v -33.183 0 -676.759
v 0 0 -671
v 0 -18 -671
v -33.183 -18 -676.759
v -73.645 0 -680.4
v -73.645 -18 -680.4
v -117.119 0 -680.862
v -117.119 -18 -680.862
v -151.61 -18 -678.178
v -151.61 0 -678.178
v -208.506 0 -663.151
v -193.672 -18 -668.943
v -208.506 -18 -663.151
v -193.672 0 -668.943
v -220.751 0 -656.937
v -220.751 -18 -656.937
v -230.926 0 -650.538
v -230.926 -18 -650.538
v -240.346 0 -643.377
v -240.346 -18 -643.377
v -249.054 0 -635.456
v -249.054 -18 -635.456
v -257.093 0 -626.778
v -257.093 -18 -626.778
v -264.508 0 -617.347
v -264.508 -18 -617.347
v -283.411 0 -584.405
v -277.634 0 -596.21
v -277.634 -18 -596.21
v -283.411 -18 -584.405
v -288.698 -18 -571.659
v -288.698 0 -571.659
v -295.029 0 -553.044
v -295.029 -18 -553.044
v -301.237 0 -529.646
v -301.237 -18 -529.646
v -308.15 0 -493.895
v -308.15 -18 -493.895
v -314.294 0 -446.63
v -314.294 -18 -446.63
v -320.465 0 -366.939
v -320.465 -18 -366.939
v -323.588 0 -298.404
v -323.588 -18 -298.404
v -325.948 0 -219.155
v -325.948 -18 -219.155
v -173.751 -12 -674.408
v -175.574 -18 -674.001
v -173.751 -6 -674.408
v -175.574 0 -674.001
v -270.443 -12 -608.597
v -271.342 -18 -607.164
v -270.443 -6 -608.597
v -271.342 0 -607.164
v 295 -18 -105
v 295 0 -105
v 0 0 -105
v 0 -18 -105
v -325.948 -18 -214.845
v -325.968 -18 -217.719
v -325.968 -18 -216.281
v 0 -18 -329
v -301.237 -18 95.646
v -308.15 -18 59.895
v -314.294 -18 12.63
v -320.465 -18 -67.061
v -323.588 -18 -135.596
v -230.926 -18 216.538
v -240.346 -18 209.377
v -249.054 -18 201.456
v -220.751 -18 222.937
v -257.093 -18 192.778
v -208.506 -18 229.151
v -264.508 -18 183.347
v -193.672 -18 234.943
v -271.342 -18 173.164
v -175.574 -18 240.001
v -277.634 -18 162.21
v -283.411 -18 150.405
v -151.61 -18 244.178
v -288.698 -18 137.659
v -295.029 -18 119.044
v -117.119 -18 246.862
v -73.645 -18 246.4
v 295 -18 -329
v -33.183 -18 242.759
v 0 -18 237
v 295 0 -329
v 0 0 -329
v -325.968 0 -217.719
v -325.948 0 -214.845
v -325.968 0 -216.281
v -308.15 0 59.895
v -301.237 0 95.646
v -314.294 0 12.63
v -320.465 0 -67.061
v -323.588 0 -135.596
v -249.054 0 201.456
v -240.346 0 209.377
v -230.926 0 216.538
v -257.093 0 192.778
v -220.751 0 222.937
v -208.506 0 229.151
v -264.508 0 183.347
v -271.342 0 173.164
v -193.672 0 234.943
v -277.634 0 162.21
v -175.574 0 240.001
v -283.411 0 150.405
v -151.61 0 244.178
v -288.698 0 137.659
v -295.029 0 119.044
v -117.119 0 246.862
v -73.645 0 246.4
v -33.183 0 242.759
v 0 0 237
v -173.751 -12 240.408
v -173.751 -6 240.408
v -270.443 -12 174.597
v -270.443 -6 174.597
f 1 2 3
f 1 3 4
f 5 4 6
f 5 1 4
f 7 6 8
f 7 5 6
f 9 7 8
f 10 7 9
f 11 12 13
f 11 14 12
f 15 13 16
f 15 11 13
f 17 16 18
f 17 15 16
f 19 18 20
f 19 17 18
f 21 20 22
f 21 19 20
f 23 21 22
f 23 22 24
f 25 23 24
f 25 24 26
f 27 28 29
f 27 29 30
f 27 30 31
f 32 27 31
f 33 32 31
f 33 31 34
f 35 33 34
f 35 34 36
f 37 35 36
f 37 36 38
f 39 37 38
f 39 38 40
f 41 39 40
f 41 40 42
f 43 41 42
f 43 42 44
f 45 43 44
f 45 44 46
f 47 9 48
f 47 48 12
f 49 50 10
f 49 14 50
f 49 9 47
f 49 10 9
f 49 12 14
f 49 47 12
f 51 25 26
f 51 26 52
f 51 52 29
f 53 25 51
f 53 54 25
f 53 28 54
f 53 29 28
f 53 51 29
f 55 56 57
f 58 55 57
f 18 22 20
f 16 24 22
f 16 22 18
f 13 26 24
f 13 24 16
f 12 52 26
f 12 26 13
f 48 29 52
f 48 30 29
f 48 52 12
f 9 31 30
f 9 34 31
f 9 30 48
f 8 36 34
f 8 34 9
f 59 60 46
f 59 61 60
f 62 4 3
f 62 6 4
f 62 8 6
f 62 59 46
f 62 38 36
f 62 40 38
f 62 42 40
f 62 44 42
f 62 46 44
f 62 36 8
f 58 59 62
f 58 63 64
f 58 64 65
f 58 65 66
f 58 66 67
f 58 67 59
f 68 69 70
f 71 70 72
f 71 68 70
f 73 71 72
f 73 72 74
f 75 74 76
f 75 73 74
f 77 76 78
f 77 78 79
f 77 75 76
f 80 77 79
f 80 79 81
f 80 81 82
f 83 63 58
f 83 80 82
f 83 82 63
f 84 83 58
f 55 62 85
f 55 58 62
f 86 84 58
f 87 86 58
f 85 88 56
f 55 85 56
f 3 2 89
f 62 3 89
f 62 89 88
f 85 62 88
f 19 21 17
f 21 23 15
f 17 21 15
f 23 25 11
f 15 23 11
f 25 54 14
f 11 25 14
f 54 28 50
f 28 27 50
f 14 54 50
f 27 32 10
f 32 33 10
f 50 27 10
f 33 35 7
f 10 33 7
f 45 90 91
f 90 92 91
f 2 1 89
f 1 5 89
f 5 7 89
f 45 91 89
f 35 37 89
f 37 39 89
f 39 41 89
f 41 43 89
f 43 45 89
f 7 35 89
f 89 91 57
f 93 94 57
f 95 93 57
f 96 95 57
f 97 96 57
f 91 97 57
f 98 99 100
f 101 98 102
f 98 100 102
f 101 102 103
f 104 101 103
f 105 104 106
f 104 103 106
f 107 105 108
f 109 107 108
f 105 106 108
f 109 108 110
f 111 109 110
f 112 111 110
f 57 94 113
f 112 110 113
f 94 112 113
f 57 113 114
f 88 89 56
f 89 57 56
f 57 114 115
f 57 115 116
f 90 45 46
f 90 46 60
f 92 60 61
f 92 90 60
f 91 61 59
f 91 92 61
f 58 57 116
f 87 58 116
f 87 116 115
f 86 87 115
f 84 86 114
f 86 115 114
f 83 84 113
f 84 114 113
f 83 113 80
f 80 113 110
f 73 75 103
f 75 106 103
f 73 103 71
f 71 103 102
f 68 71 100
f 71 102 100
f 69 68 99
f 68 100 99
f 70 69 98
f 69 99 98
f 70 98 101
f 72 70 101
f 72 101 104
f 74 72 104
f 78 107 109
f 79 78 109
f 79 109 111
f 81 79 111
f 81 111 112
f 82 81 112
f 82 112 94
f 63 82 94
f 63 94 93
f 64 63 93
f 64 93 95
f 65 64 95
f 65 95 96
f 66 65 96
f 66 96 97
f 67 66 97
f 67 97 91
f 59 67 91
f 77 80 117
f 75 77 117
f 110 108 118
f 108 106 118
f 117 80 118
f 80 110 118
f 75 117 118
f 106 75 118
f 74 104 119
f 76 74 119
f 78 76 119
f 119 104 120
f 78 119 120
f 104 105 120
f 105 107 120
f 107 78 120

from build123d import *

# Parameters (mm, degrees)
F1_DEPTH    = 18
F2_T1_DEPTH = 30.2017817416


# Not quite as in the source:
# - a fillet or chamfer that OpenCascade refuses, or shapes differently, is made with other operations: its cross-section is extruded or revolved along the edge and cut away or added


with BuildPart() as f1:
    # F0 (on Front) → F1 (new body)
    with BuildSketch(Plane.XZ):
        with BuildLine():
            Line((295, -217), (-326, -217))
            add(Edge.make_bspline(
                [(0, -671), (-40.9557190503, -680.4161054833), (-182.3770697918, -691.4241372136), (-304.1643703394, -601.8547700973), (-320.5121159554, -444.292366147), (-326, -217)],
                knots=[0, 0, 0, 0, 0.3003903091, 0.5468271605, 1, 1, 1, 1], degree=3))
            Line((0, -671), (0, -329))
            Line((0, -329), (295, -329))
            Line((295, -329), (295, -217))
        make_face()
        with BuildLine():
            add(Edge.make_bspline(
                [(0, 237), (-40.9557190503, 246.4161054833), (-182.3770697918, 257.4241372136), (-304.1643703394, 167.8547700973), (-320.5121159554, 10.292366147), (-326, -217)],
                knots=[0, 0, 0, 0, 0.3003903091, 0.5468271605, 1, 1, 1, 1], degree=3))
            Line((-326, -217), (295, -217))
            Line((295, -217), (295, -105))
            Line((295, -105), (0, -105))
            Line((0, -105), (0, 237))
        make_face()
    extrude(amount=F1_DEPTH)

    # F2: fillet of radius 100 on 1 edges, made by hand

    # F2_s2 → F2_t1 (cut)
    with BuildSketch(Plane.XZ.offset(-6.1008908708)):
        with BuildLine():
            ThreePointArc((-325.941181539, -219.4396474121), (-325.9709446514, -217), (-325.941181539, -214.5603525879))
            Line((-325.941181539, -214.5603525879), (-335.9384452278, -214.3163878467))
            ThreePointArc((-335.9384452278, -214.3163878467), (-335.9677649192, -215.5375130178), (-335.9973263945, -216.7586185188))
            Line((-335.9973263945, -216.7586185188), (-335.9973263945, -217.2413814812))
            ThreePointArc((-335.9973263945, -217.2413814812), (-335.9677649192, -218.4624869822), (-335.9384452278, -219.6836121533))
            Line((-335.9384452278, -219.6836121533), (-325.941181539, -219.4396474121))
        make_face()
    extrude(amount=F2_T1_DEPTH, mode=Mode.SUBTRACT)


solid = f1.part
